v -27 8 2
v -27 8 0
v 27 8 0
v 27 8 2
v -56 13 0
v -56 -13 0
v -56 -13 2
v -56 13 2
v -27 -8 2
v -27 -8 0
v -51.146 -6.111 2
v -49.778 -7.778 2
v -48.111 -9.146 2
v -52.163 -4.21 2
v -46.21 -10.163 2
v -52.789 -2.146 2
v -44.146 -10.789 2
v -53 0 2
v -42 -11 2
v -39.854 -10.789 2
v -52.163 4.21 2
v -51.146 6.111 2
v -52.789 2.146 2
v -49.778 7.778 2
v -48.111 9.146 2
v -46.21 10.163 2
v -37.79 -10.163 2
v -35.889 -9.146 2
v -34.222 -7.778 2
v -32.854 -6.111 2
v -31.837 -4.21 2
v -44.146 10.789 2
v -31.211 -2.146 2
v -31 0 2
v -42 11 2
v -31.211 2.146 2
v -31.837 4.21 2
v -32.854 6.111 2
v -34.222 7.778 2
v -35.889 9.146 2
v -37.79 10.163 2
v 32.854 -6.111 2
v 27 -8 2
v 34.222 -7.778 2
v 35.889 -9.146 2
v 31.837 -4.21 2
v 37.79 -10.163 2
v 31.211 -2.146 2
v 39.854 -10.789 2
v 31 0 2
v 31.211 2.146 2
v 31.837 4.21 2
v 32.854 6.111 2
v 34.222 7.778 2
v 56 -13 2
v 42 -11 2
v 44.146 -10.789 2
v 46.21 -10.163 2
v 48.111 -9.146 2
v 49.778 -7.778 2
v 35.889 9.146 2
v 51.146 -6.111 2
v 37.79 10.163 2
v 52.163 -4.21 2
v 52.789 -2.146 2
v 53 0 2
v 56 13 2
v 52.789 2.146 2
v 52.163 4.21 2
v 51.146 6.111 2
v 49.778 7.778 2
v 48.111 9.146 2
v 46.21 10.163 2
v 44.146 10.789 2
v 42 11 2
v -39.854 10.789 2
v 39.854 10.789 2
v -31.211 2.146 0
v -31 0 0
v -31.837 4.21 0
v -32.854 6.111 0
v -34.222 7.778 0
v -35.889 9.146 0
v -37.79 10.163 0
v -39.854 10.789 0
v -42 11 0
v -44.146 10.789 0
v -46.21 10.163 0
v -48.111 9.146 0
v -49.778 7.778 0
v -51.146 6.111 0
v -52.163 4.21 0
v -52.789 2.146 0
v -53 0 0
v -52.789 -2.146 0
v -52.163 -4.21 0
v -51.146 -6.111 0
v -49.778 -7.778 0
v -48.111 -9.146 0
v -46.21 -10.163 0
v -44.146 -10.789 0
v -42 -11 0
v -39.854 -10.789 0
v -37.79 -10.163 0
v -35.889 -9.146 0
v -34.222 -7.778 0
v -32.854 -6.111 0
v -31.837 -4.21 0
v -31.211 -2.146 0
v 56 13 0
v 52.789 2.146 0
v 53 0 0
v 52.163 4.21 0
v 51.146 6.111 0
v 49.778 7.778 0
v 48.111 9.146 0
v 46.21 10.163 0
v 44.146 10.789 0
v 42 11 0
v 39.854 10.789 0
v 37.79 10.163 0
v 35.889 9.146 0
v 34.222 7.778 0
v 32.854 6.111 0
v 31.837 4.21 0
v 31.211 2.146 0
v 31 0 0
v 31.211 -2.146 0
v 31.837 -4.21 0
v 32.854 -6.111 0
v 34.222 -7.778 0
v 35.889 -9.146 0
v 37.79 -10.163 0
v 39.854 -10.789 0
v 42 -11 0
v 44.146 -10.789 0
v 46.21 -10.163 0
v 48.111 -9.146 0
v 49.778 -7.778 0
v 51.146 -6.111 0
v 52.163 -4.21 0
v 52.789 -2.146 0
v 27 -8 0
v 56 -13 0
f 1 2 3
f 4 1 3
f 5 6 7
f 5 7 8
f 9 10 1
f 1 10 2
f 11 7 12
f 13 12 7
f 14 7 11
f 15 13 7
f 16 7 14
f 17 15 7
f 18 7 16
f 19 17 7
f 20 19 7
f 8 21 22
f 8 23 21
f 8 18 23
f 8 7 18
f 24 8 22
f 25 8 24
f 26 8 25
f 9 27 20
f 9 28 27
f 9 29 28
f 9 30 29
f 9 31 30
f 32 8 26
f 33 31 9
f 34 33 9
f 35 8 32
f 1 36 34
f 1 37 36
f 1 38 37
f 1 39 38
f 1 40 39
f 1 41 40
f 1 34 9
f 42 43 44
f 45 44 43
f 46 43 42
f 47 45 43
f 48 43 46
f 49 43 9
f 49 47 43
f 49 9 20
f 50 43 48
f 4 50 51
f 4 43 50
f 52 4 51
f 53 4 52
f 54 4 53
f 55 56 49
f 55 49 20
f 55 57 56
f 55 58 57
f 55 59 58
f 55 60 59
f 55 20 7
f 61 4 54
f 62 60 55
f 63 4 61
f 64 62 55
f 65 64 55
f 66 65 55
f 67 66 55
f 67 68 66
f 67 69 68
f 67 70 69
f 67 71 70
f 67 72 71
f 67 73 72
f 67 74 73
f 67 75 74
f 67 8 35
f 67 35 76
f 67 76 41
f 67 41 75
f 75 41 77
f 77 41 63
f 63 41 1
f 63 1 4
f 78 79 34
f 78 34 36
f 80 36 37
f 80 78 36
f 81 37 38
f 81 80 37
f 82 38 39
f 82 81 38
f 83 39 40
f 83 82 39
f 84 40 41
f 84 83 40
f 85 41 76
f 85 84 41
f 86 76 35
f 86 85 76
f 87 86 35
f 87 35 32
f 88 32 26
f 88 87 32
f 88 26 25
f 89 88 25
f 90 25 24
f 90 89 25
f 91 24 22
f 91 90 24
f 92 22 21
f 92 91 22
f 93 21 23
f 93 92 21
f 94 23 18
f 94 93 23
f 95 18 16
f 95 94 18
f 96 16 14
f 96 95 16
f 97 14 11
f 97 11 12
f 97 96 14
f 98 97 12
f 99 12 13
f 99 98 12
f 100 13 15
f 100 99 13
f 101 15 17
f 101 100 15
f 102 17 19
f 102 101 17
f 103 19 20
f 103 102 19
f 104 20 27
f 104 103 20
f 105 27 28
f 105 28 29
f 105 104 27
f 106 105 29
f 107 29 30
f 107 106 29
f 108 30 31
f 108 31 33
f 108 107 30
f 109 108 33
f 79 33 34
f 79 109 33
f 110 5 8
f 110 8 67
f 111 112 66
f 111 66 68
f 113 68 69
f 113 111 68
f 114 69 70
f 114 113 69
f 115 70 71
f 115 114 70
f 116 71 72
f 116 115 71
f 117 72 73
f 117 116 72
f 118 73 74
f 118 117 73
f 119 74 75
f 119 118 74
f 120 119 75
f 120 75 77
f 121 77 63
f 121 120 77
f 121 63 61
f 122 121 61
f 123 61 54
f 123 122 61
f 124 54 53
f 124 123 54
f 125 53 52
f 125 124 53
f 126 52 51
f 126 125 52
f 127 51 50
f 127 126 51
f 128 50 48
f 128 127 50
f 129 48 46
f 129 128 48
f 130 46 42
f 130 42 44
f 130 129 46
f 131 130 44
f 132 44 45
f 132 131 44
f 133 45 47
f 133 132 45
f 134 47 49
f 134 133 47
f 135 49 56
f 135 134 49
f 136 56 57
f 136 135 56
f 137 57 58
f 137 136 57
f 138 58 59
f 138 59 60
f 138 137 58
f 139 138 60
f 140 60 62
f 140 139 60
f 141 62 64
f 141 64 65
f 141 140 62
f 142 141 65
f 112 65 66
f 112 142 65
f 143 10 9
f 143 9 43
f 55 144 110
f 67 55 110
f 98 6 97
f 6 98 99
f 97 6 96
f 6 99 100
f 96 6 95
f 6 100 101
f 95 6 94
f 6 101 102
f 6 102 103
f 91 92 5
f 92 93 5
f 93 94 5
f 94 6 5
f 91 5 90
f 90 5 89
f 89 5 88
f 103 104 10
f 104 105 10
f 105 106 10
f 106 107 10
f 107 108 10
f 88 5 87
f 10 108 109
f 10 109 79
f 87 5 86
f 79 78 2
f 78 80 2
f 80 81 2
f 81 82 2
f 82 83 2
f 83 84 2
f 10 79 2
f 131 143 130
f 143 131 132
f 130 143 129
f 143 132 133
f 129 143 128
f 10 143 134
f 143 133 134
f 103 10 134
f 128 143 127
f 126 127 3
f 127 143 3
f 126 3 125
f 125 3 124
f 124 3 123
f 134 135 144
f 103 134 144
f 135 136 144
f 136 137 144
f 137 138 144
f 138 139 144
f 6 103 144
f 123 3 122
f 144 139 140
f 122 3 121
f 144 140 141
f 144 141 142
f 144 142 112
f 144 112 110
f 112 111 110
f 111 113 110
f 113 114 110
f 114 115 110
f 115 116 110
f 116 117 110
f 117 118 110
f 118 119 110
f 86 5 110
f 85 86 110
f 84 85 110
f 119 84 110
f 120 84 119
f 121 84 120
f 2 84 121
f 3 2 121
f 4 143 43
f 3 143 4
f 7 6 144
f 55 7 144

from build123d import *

# Parameters (mm, degrees)
F0_W     = 112
F0_H     = 26
F0_R     = 11
F0_W_2   = 54
F0_H_2   = 16
F1_DEPTH = 2


with BuildPart() as f1:
    # F0 (on Top) → F1 (new body)
    with BuildSketch(Plane.XY):
        Rectangle(F0_W, F0_H)
        with Locations((-42, 0)):
            Circle(F0_R, mode=Mode.SUBTRACT)
        Rectangle(F0_W_2, F0_H_2, mode=Mode.SUBTRACT)
        with Locations((42, 0)):
            Circle(F0_R, mode=Mode.SUBTRACT)
    extrude(amount=F1_DEPTH)


solid = f1.part
